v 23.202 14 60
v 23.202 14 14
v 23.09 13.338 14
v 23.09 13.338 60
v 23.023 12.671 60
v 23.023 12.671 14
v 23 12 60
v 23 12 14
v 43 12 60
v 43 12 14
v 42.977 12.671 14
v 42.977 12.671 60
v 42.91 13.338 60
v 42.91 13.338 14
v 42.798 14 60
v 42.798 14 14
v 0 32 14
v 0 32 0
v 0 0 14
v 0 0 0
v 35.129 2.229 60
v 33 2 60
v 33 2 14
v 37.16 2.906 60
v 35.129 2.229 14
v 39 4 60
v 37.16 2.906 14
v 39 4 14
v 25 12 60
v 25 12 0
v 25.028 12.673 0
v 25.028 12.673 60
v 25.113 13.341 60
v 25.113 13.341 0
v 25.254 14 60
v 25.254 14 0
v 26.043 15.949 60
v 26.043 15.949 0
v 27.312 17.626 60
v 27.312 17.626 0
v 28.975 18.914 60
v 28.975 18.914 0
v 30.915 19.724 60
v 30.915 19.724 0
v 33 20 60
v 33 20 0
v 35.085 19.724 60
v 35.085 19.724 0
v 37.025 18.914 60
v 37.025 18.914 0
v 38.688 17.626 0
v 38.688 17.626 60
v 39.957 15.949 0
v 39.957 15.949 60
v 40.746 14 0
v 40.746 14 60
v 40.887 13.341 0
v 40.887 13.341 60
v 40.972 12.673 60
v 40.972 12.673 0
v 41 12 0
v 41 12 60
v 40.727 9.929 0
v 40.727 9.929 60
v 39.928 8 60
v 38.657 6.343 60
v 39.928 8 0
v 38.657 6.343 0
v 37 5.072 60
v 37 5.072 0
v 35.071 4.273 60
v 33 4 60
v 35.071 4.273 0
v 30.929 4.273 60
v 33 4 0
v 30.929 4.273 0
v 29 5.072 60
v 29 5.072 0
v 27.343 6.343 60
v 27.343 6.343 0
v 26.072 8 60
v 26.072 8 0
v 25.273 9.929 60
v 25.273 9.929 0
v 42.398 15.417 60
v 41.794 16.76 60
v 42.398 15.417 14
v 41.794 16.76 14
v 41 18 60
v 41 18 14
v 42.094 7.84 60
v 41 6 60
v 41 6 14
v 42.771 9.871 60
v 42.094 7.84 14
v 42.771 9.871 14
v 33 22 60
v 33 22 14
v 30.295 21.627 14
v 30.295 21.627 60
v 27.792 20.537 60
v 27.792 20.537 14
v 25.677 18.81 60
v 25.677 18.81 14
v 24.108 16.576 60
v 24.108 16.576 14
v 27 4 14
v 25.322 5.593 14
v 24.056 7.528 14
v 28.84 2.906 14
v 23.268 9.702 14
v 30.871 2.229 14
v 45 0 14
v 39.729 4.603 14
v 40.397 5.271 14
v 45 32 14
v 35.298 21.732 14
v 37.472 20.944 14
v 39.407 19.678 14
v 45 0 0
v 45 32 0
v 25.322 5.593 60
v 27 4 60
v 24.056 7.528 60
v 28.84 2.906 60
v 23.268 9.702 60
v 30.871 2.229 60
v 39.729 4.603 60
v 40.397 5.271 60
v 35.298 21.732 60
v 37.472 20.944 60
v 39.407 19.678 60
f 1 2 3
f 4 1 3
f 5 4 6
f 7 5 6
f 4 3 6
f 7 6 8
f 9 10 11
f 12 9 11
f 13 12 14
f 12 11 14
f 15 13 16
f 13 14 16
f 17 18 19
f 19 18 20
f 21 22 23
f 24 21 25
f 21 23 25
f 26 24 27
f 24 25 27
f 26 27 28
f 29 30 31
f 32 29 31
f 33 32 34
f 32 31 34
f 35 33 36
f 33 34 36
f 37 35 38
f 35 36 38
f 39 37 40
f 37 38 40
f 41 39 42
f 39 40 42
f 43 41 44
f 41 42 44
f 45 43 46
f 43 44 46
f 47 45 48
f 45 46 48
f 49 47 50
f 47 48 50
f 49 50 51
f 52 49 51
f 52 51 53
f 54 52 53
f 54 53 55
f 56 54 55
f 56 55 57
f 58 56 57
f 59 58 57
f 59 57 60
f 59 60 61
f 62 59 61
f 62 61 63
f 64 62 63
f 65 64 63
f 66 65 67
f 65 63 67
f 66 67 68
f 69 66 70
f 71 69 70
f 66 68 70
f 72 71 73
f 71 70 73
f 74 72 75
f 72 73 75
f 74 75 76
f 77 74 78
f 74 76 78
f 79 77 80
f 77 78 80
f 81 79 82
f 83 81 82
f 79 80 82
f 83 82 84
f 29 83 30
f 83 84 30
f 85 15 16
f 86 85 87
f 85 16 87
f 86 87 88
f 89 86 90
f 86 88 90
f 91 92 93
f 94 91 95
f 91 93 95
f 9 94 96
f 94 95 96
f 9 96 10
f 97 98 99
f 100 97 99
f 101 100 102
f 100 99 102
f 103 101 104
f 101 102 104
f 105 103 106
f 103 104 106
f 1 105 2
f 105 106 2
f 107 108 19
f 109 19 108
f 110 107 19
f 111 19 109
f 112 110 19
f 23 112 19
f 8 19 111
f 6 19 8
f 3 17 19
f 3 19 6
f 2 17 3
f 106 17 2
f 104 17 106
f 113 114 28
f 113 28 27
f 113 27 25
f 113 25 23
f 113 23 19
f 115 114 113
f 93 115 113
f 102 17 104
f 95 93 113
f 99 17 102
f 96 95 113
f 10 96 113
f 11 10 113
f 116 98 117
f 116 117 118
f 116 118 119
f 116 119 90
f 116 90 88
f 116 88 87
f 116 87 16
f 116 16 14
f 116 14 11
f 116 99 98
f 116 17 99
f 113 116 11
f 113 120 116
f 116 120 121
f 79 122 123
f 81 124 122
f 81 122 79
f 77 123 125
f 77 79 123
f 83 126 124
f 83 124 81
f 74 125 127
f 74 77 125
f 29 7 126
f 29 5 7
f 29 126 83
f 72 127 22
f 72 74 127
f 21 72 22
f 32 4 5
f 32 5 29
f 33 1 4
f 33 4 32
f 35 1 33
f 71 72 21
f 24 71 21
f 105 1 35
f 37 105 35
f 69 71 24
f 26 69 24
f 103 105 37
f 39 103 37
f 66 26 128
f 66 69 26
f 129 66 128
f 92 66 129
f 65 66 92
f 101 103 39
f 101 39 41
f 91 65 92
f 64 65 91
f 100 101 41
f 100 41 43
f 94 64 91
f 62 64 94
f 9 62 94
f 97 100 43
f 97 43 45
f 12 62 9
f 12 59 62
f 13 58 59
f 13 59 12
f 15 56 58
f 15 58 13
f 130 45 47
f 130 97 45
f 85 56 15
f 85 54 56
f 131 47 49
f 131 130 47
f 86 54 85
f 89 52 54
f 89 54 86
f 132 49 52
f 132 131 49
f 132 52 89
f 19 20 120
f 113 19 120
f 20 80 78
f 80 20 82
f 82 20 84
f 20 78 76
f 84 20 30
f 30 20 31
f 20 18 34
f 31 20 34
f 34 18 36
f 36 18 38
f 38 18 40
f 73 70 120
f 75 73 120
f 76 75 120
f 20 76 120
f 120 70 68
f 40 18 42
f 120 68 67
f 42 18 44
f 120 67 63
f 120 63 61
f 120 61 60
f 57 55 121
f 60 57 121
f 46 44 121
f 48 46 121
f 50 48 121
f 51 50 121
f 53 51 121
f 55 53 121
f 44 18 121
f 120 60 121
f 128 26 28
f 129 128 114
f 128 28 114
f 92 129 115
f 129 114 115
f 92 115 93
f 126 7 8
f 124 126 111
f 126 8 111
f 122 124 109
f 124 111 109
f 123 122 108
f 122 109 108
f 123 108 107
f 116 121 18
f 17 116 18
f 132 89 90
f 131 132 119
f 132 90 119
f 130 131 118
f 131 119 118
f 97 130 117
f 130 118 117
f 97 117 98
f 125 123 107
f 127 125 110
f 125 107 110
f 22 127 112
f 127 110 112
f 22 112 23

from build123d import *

# Parameters (mm, degrees)
F1_DEPTH = 14
F2_DEPTH = 60


with BuildPart() as f1:
    # F0 (on Top) → F1 (new body)
    with BuildSketch(Plane.XY):
        Polygon((0, 14), (0, 0), (45, 0), (45, 14), (43, 14), (43, 12), (43, 2), (33, 2), (2, 2), (2, 4), (2, 12), (2, 14), align=None)
        Polygon((0, 32), (0, 14), (2, 14), (2, 30), (33, 30), (41, 30), (43, 30), (43, 14), (45, 14), (45, 32), align=None)
        with BuildLine():
            Line((23.2020410745, 14), (2, 14))
            Line((2, 14), (2, 12))
            Line((2, 12), (23.0000000447, 12))
            ThreePointArc((23.0000000447, 12), (23.0506385149, 13.0050896201), (23.2020410745, 14))
        make_face()
        with BuildLine():
            Line((2, 30), (2, 14))
            Line((2, 14), (23.2020410745, 14))
            ThreePointArc((23.2020410745, 14), (26.6754447115, 19.7459666607), (33, 21.9999999553))
            Line((33, 21.9999999553), (33, 30))
            Line((33, 30), (2, 30))
        make_face()
        with BuildLine():
            Line((42.7979589255, 14), (43, 14))
            Line((43, 14), (43, 30))
            Line((43, 30), (41, 30))
            Line((41, 30), (41, 17.9999999255))
            ThreePointArc((41, 17.9999999255), (42.1209558342, 16.0997760642), (42.7979589255, 14))
        make_face()
        with BuildLine():
            Line((43, 12), (43, 14))
            Line((43, 14), (42.7979589255, 14))
            ThreePointArc((42.7979589255, 14), (42.9493614851, 13.0050896201), (42.9999999553, 12))
        make_face()
        with BuildLine():
            Line((23.0000000447, 12), (2, 12))
            Line((2, 12), (2, 4))
            Line((2, 4), (27.0000000745, 4))
            ThreePointArc((27.0000000745, 4), (24.0557281433, 7.5278640383), (23.0000000447, 12))
        make_face()
        with BuildLine():
            Line((25.2540333076, 14), (23.2020410745, 14))
            ThreePointArc((23.2020410745, 14), (23.0506385149, 13.0050896201), (23.0000000447, 12))
            Line((23.0000000447, 12), (25, 12))
            ThreePointArc((25, 12), (25.0637624299, 13.0080343399), (25.2540333076, 14))
        make_face()
        with BuildLine():
            ThreePointArc((33, 21.9999999553), (26.6754447115, 19.7459666607), (23.2020410745, 14))
            Line((23.2020410745, 14), (25.2540333076, 14))
            ThreePointArc((25.2540333076, 14), (28.1010205144, 18.3245553203), (33, 20))
            Line((33, 20), (33, 21.9999999553))
        make_face()
        with BuildLine():
            ThreePointArc((41, 6.0000000745), (42.4868329475, 8.8377223822), (42.9999999553, 12))
            ThreePointArc((42.9999999553, 12), (42.9493614851, 13.0050896201), (42.7979589255, 14))
            Line((42.7979589255, 14), (41, 14))
            Line((41, 14), (41, 12))
            Line((41, 12), (41, 6.0000000745))
        make_face()
        with BuildLine():
            Line((43, 2), (43, 12))
            ThreePointArc((42.9999999553, 12), (42.4868329475, 8.8377223822), (41, 6.0000000745))
            Line((41, 6.0000000745), (41, 4))
            Line((41, 4), (38.9999999255, 4))
            ThreePointArc((38.9999999255, 4), (36.1622776178, 2.5131670525), (33, 2.0000000447))
            Line((33, 2), (43, 2))
        make_face()
        with BuildLine():
            Line((41, 14), (42.7979589255, 14))
            ThreePointArc((42.7979589255, 14), (42.1209558342, 16.0997760642), (41, 17.9999999255))
            Line((41, 17.9999999255), (41, 14))
        make_face()
        with BuildLine():
            Line((27.0000000745, 4), (2, 4))
            Line((2, 4), (2, 2))
            Line((2, 2), (33, 2))
            ThreePointArc((33, 2.0000000447), (29.8377223822, 2.5131670525), (27.0000000745, 4))
        make_face()
        with BuildLine():
            Line((25, 12), (23.0000000447, 12))
            ThreePointArc((23.0000000447, 12), (24.0557281433, 7.5278640383), (27.0000000745, 4))
            Line((27.0000000745, 4), (33, 4))
            ThreePointArc((33, 4), (27.3431457505, 6.3431457505), (25, 12))
        make_face()
        with BuildLine():
            Line((41, 30), (33, 30))
            Line((33, 30), (33, 21.9999999553))
            ThreePointArc((33, 21.9999999553), (37.4721359617, 20.9442718567), (41, 17.9999999255))
            Line((41, 17.9999999255), (41, 30))
        make_face()
        with BuildLine():
            ThreePointArc((38.9999999255, 4), (40.0710677803, 4.9289322197), (41, 6.0000000745))
            Line((41, 6.0000000745), (41, 12))
            ThreePointArc((41, 12), (38.6568542495, 6.3431457505), (33, 4))
            Line((33, 4), (38.9999999255, 4))
        make_face()
        with BuildLine():
            Line((41, 4), (41, 6.0000000745))
            ThreePointArc((41, 6.0000000745), (40.0710677803, 4.9289322197), (38.9999999255, 4))
            Line((38.9999999255, 4), (41, 4))
        make_face()
        with BuildLine():
            Line((41, 12), (41, 14))
            Line((41, 14), (40.7459666924, 14))
            ThreePointArc((40.7459666924, 14), (40.9362375701, 13.0080343399), (41, 12))
        make_face()
        with BuildLine():
            Line((33, 4), (27.0000000745, 4))
            ThreePointArc((27.0000000745, 4), (29.8377223822, 2.5131670525), (33, 2.0000000447))
            ThreePointArc((33, 2.0000000447), (36.1622776178, 2.5131670525), (38.9999999255, 4))
            Line((38.9999999255, 4), (33, 4))
        make_face()
    extrude(amount=F1_DEPTH)

    # F0 (on Top) → F2 (join)
    with BuildSketch(Plane.XY):
        with BuildLine():
            Line((25.2540333076, 14), (23.2020410745, 14))
            ThreePointArc((23.2020410745, 14), (23.0506385149, 13.0050896201), (23.0000000447, 12))
            Line((23.0000000447, 12), (25, 12))
            ThreePointArc((25, 12), (25.0637624299, 13.0080343399), (25.2540333076, 14))
        make_face()
        with BuildLine():
            ThreePointArc((33, 21.9999999553), (26.6754447115, 19.7459666607), (23.2020410745, 14))
            Line((23.2020410745, 14), (25.2540333076, 14))
            ThreePointArc((25.2540333076, 14), (28.1010205144, 18.3245553203), (33, 20))
            Line((33, 20), (33, 21.9999999553))
        make_face()
        with BuildLine():
            ThreePointArc((41, 6.0000000745), (42.4868329475, 8.8377223822), (42.9999999553, 12))
            ThreePointArc((42.9999999553, 12), (42.9493614851, 13.0050896201), (42.7979589255, 14))
            Line((42.7979589255, 14), (41, 14))
            Line((41, 14), (41, 12))
            Line((41, 12), (41, 6.0000000745))
        make_face()
        with BuildLine():
            Line((41, 14), (42.7979589255, 14))
            ThreePointArc((42.7979589255, 14), (42.1209558342, 16.0997760642), (41, 17.9999999255))
            Line((41, 17.9999999255), (41, 14))
        make_face()
        with BuildLine():
            Line((25, 12), (23.0000000447, 12))
            ThreePointArc((23.0000000447, 12), (24.0557281433, 7.5278640383), (27.0000000745, 4))
            Line((27.0000000745, 4), (33, 4))
            ThreePointArc((33, 4), (27.3431457505, 6.3431457505), (25, 12))
        make_face()
        with BuildLine():
            ThreePointArc((41, 17.9999999255), (37.4721359617, 20.9442718567), (33, 21.9999999553))
            Line((33, 21.9999999553), (33, 20))
            ThreePointArc((33, 20), (37.8989794856, 18.3245553203), (40.7459666924, 14))
            Line((40.7459666924, 14), (41, 14))
            Line((41, 14), (41, 17.9999999255))
        make_face()
        with BuildLine():
            ThreePointArc((38.9999999255, 4), (40.0710677803, 4.9289322197), (41, 6.0000000745))
            Line((41, 6.0000000745), (41, 12))
            ThreePointArc((41, 12), (38.6568542495, 6.3431457505), (33, 4))
            Line((33, 4), (38.9999999255, 4))
        make_face()
        with BuildLine():
            Line((41, 12), (41, 14))
            Line((41, 14), (40.7459666924, 14))
            ThreePointArc((40.7459666924, 14), (40.9362375701, 13.0080343399), (41, 12))
        make_face()
        with BuildLine():
            Line((33, 4), (27.0000000745, 4))
            ThreePointArc((27.0000000745, 4), (29.8377223822, 2.5131670525), (33, 2.0000000447))
            ThreePointArc((33, 2.0000000447), (36.1622776178, 2.5131670525), (38.9999999255, 4))
            Line((38.9999999255, 4), (33, 4))
        make_face()
    extrude(amount=F2_DEPTH)


solid = f1.part
